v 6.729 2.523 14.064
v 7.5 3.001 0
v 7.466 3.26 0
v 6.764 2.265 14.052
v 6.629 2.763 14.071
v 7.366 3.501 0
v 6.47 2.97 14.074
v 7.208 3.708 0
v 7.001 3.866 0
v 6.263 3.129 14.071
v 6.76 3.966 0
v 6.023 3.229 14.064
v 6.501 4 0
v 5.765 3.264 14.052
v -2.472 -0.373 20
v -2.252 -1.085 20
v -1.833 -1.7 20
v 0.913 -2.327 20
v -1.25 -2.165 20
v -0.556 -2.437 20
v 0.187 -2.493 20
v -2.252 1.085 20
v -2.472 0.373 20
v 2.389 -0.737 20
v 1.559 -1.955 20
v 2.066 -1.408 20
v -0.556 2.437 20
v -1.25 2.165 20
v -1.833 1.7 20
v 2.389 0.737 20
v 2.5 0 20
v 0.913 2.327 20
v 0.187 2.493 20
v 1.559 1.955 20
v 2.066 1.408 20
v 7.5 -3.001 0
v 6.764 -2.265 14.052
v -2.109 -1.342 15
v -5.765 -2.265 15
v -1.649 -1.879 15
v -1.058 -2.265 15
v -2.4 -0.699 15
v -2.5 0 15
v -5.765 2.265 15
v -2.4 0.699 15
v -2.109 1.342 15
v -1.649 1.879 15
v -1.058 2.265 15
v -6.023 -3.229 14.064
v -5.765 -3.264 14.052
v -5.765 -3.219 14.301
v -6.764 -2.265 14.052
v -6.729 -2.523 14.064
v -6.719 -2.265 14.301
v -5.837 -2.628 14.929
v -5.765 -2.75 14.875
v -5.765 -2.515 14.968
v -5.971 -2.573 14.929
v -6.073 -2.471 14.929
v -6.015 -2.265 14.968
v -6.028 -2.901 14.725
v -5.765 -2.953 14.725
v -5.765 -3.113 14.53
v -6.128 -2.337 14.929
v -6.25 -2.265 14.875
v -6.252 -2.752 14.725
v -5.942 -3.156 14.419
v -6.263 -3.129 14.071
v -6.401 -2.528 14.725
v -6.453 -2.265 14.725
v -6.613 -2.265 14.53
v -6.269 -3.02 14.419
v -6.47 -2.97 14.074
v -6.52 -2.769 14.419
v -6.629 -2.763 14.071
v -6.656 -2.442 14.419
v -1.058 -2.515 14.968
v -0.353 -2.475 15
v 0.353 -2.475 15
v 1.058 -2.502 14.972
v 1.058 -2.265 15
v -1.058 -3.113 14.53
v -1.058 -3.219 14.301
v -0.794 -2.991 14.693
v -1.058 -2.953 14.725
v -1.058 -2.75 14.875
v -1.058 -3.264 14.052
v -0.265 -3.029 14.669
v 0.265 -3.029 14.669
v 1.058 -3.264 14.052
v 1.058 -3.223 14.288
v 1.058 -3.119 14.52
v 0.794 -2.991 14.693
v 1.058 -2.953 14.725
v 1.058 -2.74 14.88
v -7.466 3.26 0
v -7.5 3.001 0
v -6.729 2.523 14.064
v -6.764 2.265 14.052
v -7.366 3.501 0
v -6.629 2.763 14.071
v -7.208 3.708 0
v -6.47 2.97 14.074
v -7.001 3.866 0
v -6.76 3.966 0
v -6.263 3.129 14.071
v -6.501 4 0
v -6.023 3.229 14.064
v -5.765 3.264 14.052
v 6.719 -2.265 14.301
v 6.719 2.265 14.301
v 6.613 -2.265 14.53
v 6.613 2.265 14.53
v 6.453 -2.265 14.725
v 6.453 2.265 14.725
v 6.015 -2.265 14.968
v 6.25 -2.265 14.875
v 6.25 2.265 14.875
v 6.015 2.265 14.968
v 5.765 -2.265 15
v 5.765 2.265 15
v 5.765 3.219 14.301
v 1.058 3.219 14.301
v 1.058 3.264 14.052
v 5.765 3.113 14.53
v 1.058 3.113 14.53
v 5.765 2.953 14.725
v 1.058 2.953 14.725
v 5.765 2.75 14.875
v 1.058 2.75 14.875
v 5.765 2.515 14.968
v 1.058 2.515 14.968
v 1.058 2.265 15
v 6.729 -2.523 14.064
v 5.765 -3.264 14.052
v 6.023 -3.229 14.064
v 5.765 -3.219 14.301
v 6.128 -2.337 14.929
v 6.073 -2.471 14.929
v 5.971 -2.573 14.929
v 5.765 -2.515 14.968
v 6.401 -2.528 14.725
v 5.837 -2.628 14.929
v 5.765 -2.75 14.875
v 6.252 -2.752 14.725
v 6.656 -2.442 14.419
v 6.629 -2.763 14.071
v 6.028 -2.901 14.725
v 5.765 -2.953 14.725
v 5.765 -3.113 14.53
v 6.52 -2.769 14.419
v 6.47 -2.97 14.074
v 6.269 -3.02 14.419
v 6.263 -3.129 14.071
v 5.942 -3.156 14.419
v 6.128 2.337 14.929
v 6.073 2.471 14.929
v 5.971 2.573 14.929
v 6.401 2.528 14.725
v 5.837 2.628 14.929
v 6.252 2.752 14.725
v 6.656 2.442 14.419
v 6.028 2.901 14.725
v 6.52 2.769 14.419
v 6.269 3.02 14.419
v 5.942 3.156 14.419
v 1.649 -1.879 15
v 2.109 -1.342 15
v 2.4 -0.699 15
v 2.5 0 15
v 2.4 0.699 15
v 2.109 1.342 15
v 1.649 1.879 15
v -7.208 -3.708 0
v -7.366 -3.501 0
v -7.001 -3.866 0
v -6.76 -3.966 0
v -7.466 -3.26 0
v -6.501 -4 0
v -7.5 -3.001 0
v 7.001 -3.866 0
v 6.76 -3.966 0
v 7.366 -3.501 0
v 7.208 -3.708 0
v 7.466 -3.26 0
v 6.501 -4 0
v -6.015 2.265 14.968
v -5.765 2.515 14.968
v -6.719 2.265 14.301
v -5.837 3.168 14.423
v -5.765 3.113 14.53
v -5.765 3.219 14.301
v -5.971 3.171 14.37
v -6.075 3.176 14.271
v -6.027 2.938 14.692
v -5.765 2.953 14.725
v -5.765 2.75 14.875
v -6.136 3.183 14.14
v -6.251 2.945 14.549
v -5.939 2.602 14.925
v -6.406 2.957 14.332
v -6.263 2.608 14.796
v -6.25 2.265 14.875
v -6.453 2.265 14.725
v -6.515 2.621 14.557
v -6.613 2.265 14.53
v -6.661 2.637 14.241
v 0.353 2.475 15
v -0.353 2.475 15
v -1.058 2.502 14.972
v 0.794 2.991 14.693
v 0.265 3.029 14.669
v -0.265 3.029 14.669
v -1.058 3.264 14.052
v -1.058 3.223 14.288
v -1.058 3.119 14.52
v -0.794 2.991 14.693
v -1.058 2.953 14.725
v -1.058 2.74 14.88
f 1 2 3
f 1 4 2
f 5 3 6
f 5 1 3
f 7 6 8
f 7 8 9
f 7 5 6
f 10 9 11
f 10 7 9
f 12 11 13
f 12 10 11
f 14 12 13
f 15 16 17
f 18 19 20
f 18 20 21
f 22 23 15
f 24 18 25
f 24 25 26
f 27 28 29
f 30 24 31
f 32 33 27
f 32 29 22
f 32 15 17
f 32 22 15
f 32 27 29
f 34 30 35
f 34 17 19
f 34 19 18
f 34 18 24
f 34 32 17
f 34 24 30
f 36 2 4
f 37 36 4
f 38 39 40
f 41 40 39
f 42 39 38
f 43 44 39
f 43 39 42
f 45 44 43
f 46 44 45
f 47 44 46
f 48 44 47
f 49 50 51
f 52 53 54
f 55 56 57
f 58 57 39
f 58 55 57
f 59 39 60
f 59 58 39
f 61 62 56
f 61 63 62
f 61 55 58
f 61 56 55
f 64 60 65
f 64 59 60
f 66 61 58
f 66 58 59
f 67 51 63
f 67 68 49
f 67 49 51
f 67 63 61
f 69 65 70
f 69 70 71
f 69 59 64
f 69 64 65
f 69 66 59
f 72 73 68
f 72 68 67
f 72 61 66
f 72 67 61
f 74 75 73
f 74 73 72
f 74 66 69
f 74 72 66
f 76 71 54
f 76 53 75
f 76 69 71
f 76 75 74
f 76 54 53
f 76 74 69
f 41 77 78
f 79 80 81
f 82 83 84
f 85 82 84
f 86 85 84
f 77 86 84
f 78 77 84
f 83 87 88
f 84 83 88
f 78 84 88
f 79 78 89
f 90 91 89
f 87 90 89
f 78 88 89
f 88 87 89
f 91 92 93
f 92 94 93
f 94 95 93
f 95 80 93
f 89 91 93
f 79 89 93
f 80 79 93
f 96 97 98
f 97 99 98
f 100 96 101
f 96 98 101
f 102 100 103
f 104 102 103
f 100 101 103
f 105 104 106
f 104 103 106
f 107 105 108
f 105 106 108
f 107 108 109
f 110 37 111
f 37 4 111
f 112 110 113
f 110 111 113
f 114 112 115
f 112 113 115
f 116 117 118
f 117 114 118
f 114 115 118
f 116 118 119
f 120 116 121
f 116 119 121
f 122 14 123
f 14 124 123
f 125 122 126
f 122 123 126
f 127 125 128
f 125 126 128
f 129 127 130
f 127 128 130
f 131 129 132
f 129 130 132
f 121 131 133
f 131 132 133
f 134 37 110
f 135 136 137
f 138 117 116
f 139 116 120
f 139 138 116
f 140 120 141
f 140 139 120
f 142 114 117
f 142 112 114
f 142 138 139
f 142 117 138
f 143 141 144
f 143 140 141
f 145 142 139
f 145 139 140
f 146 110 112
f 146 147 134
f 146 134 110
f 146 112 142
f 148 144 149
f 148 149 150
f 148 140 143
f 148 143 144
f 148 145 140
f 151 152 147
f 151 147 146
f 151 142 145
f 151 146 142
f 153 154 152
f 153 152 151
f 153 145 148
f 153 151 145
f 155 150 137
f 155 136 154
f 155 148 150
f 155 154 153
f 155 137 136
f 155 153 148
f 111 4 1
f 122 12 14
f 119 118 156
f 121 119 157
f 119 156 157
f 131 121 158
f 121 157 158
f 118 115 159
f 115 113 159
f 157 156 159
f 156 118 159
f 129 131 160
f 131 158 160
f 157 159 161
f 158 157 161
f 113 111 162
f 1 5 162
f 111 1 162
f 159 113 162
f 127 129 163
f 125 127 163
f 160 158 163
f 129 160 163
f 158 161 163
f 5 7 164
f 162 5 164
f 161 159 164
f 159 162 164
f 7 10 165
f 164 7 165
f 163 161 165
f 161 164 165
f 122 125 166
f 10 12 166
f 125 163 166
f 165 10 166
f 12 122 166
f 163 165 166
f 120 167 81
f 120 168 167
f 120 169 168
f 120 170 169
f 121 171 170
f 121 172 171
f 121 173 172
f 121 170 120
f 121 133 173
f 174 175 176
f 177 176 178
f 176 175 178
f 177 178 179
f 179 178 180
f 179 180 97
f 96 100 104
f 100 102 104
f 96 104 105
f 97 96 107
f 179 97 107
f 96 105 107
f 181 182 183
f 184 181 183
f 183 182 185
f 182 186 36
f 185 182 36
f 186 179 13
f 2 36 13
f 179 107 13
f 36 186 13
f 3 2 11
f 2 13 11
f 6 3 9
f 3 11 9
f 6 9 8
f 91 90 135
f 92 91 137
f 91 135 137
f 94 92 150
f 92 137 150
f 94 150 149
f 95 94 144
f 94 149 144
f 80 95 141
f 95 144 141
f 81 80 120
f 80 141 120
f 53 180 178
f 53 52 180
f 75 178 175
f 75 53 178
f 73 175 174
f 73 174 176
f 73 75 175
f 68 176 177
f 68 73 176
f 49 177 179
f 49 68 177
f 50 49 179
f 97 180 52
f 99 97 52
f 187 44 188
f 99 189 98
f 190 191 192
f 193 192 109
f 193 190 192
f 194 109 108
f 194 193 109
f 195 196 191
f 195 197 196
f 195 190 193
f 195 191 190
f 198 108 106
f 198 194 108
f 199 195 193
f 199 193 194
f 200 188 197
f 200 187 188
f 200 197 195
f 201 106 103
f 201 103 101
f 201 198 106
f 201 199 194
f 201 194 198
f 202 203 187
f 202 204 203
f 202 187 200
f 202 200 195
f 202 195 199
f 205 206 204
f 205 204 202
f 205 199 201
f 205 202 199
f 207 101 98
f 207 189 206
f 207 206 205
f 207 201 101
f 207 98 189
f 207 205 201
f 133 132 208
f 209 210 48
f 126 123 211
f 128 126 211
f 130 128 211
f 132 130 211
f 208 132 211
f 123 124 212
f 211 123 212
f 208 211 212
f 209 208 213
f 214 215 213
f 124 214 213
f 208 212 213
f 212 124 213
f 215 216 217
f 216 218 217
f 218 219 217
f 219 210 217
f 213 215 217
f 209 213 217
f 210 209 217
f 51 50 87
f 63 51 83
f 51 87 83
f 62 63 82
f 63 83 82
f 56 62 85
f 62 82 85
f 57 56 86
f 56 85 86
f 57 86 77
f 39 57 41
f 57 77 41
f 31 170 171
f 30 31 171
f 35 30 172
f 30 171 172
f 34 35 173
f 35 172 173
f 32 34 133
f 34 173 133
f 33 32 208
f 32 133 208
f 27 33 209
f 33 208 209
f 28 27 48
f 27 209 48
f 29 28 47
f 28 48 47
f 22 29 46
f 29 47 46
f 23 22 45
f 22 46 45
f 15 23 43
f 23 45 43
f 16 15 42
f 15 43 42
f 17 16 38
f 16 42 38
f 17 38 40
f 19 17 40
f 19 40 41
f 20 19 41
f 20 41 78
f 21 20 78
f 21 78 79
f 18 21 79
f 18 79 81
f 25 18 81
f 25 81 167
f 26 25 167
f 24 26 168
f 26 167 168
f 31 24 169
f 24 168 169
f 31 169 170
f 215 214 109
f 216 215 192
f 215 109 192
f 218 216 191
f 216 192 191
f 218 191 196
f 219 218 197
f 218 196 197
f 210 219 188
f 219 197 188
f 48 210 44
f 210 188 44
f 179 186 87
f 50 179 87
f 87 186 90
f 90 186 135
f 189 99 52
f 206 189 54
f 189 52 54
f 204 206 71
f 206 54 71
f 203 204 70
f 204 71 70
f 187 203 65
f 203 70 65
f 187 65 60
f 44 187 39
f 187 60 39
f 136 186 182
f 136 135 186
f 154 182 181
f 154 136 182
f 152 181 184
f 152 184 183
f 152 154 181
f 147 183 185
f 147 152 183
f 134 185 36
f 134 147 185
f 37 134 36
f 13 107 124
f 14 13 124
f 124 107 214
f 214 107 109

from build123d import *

# Parameters (mm, degrees)
F0_W     = 15
F0_H     = 8
F1_DEPTH = 15
F1_TAPER = 3
F2_R     = 2.5
F3_DEPTH = 5
F4_R     = 1


with BuildPart() as f1:
    # F0 (on Top) → F1 (new body)
    with BuildSketch(Plane.XY):
        Rectangle(F0_W, F0_H)
    extrude(amount=F1_DEPTH, taper=F1_TAPER)

    # F2 (on face) → F3 (join)
    with BuildSketch(Plane.XY.offset(15)):
        Circle(F2_R)
    extrude(amount=F3_DEPTH)

    # F4
    f4_edges = [f1.edges().sort_by_distance(p)[0] for p in [
        (-7.106942, -3.606942, 7.5),
        (7.106942, -3.606942, 7.5),
        (7.106942, 3.606942, 7.5),
        (6.713883, 0, 15),
        (0, -3.213883, 15),
        (-6.713883, 0, 15),
        (0, 3.213883, 15),
        (-7.106942, 3.606942, 7.5),
    ]]
    fillet(f4_edges, radius=F4_R)


solid = f1.part
